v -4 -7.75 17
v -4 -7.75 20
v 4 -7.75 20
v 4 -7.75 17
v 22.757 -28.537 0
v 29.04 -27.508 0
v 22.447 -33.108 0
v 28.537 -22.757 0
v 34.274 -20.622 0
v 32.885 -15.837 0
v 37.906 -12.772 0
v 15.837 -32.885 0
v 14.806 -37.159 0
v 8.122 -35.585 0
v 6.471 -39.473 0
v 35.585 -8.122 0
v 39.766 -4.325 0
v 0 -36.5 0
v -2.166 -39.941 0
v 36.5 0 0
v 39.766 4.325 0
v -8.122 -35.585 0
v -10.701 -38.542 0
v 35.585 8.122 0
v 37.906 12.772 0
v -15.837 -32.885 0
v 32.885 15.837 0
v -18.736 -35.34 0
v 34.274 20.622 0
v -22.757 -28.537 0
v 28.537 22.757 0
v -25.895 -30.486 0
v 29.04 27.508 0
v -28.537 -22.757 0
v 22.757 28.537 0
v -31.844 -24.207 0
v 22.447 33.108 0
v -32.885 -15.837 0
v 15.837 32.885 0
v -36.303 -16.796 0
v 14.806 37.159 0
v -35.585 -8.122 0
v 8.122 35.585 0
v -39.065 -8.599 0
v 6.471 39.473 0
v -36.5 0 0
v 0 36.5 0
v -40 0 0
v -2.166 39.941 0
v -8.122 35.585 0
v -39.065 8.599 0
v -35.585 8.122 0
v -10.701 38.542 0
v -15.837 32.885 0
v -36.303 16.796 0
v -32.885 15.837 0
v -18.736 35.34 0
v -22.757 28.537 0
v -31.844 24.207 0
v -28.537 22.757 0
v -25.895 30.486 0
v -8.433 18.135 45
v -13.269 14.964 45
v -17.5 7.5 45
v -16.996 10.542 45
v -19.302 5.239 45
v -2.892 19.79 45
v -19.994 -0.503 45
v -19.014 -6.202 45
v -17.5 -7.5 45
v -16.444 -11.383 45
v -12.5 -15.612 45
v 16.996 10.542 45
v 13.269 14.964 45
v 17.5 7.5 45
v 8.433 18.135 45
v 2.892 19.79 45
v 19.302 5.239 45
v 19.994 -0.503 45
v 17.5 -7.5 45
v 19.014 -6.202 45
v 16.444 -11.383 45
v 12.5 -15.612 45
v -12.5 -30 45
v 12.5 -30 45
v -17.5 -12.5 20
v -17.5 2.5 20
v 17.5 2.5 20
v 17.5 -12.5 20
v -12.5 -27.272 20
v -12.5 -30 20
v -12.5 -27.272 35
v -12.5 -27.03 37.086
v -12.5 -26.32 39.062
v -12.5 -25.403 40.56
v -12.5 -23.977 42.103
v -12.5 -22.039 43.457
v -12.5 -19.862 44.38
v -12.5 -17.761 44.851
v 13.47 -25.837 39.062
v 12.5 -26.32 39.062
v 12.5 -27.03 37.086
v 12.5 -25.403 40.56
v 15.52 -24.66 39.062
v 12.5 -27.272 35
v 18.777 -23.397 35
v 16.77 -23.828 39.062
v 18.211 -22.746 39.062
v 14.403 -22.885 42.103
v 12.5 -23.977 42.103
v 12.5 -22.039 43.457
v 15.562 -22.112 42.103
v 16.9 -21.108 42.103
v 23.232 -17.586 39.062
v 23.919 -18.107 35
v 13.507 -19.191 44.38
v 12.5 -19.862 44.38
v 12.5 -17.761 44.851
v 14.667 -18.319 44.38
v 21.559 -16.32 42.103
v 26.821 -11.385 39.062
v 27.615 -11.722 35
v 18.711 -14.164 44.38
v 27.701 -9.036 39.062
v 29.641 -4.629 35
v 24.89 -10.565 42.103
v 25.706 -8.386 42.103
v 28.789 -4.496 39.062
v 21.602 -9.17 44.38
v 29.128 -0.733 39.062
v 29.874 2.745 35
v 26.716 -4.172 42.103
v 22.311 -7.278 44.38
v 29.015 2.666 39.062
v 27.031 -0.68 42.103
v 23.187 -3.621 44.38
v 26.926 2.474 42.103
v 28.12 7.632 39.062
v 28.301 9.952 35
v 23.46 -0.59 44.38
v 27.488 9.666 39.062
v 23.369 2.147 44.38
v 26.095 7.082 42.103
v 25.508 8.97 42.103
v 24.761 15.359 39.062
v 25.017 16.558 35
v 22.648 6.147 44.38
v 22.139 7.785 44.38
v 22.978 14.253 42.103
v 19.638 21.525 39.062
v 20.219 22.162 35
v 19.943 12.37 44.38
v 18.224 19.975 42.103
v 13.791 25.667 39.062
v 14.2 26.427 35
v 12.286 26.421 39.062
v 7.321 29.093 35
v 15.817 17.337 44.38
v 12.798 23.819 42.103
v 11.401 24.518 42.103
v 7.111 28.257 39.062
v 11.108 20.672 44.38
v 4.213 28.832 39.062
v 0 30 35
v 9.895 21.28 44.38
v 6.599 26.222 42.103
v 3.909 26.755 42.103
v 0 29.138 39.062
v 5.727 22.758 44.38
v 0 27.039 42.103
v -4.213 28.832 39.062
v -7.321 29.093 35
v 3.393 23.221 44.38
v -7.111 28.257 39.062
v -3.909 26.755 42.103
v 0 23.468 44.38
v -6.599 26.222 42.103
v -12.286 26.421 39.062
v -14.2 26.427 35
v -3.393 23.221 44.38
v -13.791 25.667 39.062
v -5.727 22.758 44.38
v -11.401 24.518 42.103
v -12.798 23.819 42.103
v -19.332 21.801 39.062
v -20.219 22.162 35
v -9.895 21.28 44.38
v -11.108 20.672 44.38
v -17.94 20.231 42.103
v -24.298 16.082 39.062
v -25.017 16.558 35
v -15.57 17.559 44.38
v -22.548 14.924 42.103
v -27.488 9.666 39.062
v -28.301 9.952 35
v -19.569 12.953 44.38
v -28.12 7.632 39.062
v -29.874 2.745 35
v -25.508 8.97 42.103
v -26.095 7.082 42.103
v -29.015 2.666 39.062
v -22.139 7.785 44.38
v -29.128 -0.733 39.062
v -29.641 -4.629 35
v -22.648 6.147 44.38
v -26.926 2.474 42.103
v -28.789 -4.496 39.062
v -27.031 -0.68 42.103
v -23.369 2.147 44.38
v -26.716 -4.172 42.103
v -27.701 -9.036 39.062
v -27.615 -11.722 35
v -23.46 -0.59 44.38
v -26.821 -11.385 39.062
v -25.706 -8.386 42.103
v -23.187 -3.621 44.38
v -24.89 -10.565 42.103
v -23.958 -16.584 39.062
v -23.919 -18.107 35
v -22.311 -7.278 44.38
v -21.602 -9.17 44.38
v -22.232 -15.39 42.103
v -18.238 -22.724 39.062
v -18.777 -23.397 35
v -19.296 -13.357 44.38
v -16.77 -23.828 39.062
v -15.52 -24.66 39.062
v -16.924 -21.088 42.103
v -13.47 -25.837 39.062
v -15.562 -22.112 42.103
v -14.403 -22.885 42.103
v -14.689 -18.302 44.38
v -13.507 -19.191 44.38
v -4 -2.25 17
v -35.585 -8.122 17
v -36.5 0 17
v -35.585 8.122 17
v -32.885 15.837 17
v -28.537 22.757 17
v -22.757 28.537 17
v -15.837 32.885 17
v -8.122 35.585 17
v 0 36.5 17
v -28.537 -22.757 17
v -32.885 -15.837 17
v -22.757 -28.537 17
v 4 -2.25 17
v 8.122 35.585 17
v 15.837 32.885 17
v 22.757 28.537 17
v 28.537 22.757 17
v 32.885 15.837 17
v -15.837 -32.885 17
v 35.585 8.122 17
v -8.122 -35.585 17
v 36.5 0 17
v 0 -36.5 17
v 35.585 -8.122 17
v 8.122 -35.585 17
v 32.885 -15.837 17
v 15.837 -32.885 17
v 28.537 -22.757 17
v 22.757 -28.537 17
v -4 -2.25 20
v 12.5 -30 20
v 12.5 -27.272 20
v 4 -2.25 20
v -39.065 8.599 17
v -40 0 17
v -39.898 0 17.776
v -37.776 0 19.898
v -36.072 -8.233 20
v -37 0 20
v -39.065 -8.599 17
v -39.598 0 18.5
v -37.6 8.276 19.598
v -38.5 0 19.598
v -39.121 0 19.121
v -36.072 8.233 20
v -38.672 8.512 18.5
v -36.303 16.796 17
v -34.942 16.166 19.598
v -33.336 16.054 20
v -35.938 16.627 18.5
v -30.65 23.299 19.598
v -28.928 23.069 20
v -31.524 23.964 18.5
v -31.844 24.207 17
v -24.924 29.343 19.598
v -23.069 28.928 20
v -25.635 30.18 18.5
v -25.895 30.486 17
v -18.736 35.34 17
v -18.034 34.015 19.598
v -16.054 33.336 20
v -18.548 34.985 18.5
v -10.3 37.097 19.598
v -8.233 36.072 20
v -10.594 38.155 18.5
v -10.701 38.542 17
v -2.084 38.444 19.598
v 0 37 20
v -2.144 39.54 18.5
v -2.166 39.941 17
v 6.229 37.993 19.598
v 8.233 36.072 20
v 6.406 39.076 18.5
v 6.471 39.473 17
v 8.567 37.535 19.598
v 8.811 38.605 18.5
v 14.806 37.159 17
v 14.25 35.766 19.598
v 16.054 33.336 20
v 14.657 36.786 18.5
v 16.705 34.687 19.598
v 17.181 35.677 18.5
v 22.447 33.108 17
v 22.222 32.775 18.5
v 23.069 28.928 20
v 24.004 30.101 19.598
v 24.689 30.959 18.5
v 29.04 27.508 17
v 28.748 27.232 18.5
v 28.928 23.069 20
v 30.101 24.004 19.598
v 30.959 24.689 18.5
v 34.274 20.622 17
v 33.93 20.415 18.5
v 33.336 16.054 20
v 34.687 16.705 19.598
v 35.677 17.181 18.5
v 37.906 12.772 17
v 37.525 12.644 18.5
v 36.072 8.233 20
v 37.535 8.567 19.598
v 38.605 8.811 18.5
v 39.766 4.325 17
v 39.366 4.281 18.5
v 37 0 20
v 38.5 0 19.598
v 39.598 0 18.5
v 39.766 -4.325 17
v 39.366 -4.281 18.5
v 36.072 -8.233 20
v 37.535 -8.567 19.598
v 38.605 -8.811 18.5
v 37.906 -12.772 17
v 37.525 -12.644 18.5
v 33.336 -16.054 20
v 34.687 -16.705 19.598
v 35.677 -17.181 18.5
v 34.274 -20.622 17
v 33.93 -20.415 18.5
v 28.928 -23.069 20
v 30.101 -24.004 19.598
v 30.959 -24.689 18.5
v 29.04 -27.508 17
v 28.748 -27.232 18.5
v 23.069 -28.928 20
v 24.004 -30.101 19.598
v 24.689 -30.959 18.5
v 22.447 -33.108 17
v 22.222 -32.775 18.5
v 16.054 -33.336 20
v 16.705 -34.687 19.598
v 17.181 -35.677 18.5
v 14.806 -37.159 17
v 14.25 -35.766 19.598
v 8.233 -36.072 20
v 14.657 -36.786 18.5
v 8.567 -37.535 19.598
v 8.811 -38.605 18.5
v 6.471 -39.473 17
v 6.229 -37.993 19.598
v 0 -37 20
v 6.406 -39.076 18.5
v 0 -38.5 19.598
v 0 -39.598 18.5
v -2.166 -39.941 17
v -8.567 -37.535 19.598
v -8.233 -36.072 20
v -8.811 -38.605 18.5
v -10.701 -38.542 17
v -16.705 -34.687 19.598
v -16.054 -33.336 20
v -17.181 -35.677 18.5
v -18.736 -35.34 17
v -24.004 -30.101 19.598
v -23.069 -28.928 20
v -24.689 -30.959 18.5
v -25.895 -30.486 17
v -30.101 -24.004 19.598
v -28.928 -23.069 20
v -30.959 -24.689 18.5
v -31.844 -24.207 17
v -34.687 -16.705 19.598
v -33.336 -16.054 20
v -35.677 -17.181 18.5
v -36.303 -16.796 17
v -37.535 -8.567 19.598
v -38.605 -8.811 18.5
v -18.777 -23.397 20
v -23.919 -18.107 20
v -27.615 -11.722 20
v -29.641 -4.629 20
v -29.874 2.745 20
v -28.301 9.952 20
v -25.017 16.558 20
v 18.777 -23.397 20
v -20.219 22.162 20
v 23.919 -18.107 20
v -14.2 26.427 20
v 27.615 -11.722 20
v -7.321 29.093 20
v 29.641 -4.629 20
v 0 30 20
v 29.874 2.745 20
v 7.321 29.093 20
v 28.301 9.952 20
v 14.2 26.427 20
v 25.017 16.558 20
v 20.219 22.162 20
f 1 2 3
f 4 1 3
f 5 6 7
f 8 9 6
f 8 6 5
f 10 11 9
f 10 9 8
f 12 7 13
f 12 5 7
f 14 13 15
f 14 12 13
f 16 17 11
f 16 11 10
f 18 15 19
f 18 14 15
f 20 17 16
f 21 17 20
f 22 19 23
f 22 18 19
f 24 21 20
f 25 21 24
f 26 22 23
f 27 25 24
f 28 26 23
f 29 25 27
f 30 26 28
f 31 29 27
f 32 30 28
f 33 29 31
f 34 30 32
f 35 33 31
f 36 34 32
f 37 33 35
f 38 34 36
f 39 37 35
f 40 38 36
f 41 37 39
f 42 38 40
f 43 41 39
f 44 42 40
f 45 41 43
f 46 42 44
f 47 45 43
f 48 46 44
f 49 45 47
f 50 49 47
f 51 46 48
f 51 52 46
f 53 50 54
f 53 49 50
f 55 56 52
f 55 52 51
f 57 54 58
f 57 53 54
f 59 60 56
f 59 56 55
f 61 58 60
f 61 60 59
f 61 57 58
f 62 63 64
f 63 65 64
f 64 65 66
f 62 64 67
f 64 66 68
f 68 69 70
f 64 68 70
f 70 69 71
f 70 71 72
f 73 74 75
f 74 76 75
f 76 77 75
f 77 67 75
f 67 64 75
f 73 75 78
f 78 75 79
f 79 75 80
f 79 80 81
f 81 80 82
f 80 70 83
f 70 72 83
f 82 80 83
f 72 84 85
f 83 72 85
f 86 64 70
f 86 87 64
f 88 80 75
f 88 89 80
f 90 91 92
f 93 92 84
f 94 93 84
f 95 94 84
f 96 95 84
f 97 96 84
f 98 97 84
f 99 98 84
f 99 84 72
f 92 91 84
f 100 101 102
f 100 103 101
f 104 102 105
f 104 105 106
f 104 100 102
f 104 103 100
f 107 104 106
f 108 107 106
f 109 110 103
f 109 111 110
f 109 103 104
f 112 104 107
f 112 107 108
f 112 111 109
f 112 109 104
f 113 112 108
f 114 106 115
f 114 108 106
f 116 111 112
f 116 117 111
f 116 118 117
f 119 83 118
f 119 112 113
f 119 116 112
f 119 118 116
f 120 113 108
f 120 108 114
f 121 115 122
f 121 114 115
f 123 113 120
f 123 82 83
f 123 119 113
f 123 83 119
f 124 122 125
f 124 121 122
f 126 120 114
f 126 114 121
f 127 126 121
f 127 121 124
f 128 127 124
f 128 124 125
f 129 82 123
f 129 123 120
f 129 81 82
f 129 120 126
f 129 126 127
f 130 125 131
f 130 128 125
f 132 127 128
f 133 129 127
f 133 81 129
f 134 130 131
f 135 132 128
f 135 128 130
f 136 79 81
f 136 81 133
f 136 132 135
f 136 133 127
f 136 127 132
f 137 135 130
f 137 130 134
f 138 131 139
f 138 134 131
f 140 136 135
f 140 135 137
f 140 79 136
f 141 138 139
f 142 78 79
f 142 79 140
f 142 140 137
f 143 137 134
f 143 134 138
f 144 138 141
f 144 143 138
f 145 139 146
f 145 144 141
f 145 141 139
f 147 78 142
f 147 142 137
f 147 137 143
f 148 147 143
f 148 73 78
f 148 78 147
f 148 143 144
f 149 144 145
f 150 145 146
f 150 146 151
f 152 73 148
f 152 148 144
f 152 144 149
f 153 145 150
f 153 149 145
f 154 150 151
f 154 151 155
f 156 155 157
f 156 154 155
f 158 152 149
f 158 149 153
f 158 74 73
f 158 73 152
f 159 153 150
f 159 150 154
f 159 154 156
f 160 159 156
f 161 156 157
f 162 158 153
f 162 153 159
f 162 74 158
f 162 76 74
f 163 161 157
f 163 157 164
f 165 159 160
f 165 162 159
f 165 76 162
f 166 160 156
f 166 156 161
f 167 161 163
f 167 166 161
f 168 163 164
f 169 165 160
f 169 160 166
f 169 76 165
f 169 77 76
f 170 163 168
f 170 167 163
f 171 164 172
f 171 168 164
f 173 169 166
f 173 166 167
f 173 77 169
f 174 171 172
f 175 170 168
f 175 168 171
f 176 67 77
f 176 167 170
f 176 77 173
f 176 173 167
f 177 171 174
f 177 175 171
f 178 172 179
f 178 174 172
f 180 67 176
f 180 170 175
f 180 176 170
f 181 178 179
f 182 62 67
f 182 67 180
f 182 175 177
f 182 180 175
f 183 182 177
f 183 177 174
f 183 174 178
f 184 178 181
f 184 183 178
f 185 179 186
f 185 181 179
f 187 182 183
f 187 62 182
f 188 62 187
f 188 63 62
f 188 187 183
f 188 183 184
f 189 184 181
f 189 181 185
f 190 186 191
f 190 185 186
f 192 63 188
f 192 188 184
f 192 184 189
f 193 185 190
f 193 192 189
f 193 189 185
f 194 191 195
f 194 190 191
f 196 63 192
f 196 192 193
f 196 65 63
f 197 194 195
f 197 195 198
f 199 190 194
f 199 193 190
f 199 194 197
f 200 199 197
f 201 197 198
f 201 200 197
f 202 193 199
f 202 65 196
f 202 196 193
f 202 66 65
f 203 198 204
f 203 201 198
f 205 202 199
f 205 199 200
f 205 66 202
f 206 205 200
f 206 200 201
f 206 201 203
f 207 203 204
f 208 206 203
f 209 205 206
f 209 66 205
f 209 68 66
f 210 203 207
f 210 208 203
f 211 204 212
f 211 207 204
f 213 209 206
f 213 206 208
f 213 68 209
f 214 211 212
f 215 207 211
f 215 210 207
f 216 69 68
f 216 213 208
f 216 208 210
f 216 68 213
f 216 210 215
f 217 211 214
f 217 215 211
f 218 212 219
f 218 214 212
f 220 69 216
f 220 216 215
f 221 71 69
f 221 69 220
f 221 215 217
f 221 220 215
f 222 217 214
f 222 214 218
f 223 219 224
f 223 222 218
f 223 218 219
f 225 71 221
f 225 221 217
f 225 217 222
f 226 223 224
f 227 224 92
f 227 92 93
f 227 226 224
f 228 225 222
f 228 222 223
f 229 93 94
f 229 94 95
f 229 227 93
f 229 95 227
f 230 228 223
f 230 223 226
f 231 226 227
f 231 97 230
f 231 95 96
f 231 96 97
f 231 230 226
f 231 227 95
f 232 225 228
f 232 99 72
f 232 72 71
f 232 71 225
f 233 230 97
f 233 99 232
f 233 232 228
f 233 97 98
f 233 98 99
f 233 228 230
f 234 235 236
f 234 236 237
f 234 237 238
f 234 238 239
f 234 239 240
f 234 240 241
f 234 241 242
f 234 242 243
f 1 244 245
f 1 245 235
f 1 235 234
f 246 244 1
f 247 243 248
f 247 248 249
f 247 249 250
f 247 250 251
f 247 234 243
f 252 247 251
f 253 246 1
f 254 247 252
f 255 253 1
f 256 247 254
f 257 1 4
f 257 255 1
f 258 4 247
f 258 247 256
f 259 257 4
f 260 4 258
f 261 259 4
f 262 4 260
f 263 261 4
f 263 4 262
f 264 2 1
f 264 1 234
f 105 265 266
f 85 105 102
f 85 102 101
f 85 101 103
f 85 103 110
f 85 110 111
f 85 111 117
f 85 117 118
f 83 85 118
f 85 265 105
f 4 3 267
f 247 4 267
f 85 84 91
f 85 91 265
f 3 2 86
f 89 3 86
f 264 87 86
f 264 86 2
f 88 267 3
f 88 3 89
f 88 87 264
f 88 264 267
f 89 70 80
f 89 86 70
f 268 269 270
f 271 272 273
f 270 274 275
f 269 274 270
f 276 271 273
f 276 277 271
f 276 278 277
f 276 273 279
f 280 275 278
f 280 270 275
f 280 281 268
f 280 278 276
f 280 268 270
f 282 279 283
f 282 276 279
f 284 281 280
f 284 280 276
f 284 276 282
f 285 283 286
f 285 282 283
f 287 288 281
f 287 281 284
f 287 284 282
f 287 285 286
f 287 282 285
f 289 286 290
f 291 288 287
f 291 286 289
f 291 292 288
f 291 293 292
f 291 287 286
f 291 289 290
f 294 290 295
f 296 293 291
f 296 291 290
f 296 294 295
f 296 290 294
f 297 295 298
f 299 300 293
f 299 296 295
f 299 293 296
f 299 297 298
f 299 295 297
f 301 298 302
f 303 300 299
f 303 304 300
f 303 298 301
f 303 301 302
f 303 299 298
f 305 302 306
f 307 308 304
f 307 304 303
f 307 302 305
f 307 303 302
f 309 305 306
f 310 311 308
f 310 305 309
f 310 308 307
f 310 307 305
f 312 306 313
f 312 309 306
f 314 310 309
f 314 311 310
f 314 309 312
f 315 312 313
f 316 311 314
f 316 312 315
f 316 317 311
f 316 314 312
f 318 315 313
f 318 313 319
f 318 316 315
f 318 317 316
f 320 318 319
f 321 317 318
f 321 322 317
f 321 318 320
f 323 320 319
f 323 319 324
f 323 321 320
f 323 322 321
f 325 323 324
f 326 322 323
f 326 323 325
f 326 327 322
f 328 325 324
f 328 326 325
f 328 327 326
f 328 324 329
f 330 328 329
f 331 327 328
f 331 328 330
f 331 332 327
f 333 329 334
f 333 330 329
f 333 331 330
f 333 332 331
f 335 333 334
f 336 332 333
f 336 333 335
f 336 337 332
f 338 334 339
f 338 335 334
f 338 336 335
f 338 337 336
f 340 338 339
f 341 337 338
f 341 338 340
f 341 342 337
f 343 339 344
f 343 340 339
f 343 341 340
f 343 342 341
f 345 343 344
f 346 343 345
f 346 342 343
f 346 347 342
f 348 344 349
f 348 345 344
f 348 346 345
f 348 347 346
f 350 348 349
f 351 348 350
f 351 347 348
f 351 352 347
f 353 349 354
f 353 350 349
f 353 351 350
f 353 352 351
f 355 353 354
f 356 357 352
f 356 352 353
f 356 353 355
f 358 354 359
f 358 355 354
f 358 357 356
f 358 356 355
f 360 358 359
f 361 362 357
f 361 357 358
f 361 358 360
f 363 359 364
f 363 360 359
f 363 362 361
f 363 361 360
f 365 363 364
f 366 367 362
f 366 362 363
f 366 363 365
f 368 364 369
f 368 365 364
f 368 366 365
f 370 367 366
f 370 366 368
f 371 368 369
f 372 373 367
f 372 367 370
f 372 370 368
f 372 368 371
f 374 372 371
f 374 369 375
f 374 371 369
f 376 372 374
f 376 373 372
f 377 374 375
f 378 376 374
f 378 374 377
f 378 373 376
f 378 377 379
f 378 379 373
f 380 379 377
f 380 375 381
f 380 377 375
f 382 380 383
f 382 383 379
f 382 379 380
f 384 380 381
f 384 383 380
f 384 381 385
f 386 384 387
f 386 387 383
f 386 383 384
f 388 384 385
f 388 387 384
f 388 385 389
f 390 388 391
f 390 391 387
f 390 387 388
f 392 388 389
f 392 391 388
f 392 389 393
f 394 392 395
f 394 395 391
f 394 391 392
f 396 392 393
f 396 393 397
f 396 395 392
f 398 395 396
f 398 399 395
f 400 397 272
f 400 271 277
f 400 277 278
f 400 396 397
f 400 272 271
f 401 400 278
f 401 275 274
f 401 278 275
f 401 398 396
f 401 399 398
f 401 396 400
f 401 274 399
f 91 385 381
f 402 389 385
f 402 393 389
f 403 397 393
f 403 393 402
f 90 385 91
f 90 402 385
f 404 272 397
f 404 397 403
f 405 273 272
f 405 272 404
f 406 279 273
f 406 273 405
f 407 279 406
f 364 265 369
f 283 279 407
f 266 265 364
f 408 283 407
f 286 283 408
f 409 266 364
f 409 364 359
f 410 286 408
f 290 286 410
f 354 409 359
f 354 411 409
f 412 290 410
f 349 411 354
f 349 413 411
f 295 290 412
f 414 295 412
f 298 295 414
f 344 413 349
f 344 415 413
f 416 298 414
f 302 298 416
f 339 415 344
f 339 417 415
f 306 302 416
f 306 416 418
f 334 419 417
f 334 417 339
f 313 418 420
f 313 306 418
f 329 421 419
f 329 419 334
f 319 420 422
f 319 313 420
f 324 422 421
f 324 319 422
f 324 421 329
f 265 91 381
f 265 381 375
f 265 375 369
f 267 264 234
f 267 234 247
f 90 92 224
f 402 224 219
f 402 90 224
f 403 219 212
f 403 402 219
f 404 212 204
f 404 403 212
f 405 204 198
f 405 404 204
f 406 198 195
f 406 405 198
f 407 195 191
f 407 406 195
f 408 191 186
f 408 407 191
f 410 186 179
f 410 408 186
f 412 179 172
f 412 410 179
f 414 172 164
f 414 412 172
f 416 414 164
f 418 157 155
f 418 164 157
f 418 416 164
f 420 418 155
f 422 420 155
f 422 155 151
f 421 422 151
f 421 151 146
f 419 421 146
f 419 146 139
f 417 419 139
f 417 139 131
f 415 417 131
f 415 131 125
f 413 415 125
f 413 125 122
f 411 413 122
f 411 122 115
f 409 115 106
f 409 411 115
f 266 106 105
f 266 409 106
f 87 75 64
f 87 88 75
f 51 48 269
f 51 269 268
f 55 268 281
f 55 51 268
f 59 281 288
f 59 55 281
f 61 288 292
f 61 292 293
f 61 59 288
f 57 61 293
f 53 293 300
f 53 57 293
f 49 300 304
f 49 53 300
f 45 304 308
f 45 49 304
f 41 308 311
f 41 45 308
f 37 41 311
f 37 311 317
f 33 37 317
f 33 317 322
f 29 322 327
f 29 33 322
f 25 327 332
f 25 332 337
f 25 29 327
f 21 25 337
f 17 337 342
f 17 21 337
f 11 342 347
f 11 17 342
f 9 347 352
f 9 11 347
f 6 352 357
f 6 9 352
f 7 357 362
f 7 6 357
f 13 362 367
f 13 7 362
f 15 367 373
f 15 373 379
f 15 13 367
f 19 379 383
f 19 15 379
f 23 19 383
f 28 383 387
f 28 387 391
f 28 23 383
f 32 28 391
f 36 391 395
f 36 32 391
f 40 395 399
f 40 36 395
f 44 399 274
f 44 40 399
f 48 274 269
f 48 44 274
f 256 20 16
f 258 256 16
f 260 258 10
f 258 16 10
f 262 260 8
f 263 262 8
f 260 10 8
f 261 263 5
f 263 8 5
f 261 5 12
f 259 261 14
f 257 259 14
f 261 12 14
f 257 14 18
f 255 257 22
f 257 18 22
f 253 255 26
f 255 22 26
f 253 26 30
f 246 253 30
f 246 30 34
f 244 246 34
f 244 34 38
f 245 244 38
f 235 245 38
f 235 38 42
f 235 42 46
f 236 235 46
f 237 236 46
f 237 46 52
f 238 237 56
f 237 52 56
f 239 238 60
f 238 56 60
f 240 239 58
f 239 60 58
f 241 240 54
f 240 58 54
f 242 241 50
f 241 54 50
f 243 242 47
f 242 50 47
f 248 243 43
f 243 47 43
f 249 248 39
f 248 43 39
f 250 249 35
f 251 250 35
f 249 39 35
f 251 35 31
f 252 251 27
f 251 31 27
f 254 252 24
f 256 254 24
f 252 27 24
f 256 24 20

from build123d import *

# Parameters (mm, degrees)
F3_W      = 25
F3_H      = 25
F4_DEPTH  = 25
F5_R      = 10
F6_R      = 3
F7_W      = 35
F7_H      = 15
F8_W      = 35
F8_H      = 15
F10_R     = 36.5
F11_DEPTH = 17
F12_W     = 8
F12_H     = 5.5
F13_DEPTH = 20.001


with BuildPart() as f1:
    # F0 (on Front) → F1 (revolve)
    with BuildSketch(Plane.XZ):
        Polygon((-40, 0), (0, 0), (0, 20), (0, 45), (-30, 45), (-30, 20), (-40, 20), align=None)
    revolve(axis=Axis((0, 0, 32.5), (0, 0, -1)))

    # F3 (on offset) → F4 (join)
    with BuildSketch(Plane.XZ.offset(30)):
        with Locations((0, 32.5)):
            Rectangle(F3_W, F3_H)
    extrude(amount=-F4_DEPTH)

    # F5
    f5_edges = [f1.edges().sort_by_distance(p)[0] for p in [
        (0, 30, 45),
    ]]
    fillet(f5_edges, radius=F5_R)

    # F6
    f6_edges = [f1.edges().sort_by_distance(p)[0] for p in [
        (40, 0, 20),
    ]]
    fillet(f6_edges, radius=F6_R)

    # F7 (on face) → F9 section 0
    with BuildSketch(Plane.XY.offset(45)):
        Rectangle(F7_W, F7_H)
    # F8 (on face) → F9 section 1
    with BuildSketch(Plane.XY.offset(20)):
        with Locations((0, -5)):
            Rectangle(F8_W, F8_H)
    loft(mode=Mode.SUBTRACT)

    # F10 (on face) → F11 (cut)
    with BuildSketch(Plane(origin=(0, 0, 0), x_dir=(1, 0, 0), z_dir=(0, 0, -1))):
        Circle(F10_R)
    extrude(amount=-F11_DEPTH, mode=Mode.SUBTRACT)

    # F12 (on face) → F13 (cut, through all)
    with BuildSketch(Plane.XY.offset(20)):
        with Locations((0, -5)):
            Rectangle(F12_W, F12_H)
    extrude(amount=-F13_DEPTH, mode=Mode.SUBTRACT)


solid = f1.part
